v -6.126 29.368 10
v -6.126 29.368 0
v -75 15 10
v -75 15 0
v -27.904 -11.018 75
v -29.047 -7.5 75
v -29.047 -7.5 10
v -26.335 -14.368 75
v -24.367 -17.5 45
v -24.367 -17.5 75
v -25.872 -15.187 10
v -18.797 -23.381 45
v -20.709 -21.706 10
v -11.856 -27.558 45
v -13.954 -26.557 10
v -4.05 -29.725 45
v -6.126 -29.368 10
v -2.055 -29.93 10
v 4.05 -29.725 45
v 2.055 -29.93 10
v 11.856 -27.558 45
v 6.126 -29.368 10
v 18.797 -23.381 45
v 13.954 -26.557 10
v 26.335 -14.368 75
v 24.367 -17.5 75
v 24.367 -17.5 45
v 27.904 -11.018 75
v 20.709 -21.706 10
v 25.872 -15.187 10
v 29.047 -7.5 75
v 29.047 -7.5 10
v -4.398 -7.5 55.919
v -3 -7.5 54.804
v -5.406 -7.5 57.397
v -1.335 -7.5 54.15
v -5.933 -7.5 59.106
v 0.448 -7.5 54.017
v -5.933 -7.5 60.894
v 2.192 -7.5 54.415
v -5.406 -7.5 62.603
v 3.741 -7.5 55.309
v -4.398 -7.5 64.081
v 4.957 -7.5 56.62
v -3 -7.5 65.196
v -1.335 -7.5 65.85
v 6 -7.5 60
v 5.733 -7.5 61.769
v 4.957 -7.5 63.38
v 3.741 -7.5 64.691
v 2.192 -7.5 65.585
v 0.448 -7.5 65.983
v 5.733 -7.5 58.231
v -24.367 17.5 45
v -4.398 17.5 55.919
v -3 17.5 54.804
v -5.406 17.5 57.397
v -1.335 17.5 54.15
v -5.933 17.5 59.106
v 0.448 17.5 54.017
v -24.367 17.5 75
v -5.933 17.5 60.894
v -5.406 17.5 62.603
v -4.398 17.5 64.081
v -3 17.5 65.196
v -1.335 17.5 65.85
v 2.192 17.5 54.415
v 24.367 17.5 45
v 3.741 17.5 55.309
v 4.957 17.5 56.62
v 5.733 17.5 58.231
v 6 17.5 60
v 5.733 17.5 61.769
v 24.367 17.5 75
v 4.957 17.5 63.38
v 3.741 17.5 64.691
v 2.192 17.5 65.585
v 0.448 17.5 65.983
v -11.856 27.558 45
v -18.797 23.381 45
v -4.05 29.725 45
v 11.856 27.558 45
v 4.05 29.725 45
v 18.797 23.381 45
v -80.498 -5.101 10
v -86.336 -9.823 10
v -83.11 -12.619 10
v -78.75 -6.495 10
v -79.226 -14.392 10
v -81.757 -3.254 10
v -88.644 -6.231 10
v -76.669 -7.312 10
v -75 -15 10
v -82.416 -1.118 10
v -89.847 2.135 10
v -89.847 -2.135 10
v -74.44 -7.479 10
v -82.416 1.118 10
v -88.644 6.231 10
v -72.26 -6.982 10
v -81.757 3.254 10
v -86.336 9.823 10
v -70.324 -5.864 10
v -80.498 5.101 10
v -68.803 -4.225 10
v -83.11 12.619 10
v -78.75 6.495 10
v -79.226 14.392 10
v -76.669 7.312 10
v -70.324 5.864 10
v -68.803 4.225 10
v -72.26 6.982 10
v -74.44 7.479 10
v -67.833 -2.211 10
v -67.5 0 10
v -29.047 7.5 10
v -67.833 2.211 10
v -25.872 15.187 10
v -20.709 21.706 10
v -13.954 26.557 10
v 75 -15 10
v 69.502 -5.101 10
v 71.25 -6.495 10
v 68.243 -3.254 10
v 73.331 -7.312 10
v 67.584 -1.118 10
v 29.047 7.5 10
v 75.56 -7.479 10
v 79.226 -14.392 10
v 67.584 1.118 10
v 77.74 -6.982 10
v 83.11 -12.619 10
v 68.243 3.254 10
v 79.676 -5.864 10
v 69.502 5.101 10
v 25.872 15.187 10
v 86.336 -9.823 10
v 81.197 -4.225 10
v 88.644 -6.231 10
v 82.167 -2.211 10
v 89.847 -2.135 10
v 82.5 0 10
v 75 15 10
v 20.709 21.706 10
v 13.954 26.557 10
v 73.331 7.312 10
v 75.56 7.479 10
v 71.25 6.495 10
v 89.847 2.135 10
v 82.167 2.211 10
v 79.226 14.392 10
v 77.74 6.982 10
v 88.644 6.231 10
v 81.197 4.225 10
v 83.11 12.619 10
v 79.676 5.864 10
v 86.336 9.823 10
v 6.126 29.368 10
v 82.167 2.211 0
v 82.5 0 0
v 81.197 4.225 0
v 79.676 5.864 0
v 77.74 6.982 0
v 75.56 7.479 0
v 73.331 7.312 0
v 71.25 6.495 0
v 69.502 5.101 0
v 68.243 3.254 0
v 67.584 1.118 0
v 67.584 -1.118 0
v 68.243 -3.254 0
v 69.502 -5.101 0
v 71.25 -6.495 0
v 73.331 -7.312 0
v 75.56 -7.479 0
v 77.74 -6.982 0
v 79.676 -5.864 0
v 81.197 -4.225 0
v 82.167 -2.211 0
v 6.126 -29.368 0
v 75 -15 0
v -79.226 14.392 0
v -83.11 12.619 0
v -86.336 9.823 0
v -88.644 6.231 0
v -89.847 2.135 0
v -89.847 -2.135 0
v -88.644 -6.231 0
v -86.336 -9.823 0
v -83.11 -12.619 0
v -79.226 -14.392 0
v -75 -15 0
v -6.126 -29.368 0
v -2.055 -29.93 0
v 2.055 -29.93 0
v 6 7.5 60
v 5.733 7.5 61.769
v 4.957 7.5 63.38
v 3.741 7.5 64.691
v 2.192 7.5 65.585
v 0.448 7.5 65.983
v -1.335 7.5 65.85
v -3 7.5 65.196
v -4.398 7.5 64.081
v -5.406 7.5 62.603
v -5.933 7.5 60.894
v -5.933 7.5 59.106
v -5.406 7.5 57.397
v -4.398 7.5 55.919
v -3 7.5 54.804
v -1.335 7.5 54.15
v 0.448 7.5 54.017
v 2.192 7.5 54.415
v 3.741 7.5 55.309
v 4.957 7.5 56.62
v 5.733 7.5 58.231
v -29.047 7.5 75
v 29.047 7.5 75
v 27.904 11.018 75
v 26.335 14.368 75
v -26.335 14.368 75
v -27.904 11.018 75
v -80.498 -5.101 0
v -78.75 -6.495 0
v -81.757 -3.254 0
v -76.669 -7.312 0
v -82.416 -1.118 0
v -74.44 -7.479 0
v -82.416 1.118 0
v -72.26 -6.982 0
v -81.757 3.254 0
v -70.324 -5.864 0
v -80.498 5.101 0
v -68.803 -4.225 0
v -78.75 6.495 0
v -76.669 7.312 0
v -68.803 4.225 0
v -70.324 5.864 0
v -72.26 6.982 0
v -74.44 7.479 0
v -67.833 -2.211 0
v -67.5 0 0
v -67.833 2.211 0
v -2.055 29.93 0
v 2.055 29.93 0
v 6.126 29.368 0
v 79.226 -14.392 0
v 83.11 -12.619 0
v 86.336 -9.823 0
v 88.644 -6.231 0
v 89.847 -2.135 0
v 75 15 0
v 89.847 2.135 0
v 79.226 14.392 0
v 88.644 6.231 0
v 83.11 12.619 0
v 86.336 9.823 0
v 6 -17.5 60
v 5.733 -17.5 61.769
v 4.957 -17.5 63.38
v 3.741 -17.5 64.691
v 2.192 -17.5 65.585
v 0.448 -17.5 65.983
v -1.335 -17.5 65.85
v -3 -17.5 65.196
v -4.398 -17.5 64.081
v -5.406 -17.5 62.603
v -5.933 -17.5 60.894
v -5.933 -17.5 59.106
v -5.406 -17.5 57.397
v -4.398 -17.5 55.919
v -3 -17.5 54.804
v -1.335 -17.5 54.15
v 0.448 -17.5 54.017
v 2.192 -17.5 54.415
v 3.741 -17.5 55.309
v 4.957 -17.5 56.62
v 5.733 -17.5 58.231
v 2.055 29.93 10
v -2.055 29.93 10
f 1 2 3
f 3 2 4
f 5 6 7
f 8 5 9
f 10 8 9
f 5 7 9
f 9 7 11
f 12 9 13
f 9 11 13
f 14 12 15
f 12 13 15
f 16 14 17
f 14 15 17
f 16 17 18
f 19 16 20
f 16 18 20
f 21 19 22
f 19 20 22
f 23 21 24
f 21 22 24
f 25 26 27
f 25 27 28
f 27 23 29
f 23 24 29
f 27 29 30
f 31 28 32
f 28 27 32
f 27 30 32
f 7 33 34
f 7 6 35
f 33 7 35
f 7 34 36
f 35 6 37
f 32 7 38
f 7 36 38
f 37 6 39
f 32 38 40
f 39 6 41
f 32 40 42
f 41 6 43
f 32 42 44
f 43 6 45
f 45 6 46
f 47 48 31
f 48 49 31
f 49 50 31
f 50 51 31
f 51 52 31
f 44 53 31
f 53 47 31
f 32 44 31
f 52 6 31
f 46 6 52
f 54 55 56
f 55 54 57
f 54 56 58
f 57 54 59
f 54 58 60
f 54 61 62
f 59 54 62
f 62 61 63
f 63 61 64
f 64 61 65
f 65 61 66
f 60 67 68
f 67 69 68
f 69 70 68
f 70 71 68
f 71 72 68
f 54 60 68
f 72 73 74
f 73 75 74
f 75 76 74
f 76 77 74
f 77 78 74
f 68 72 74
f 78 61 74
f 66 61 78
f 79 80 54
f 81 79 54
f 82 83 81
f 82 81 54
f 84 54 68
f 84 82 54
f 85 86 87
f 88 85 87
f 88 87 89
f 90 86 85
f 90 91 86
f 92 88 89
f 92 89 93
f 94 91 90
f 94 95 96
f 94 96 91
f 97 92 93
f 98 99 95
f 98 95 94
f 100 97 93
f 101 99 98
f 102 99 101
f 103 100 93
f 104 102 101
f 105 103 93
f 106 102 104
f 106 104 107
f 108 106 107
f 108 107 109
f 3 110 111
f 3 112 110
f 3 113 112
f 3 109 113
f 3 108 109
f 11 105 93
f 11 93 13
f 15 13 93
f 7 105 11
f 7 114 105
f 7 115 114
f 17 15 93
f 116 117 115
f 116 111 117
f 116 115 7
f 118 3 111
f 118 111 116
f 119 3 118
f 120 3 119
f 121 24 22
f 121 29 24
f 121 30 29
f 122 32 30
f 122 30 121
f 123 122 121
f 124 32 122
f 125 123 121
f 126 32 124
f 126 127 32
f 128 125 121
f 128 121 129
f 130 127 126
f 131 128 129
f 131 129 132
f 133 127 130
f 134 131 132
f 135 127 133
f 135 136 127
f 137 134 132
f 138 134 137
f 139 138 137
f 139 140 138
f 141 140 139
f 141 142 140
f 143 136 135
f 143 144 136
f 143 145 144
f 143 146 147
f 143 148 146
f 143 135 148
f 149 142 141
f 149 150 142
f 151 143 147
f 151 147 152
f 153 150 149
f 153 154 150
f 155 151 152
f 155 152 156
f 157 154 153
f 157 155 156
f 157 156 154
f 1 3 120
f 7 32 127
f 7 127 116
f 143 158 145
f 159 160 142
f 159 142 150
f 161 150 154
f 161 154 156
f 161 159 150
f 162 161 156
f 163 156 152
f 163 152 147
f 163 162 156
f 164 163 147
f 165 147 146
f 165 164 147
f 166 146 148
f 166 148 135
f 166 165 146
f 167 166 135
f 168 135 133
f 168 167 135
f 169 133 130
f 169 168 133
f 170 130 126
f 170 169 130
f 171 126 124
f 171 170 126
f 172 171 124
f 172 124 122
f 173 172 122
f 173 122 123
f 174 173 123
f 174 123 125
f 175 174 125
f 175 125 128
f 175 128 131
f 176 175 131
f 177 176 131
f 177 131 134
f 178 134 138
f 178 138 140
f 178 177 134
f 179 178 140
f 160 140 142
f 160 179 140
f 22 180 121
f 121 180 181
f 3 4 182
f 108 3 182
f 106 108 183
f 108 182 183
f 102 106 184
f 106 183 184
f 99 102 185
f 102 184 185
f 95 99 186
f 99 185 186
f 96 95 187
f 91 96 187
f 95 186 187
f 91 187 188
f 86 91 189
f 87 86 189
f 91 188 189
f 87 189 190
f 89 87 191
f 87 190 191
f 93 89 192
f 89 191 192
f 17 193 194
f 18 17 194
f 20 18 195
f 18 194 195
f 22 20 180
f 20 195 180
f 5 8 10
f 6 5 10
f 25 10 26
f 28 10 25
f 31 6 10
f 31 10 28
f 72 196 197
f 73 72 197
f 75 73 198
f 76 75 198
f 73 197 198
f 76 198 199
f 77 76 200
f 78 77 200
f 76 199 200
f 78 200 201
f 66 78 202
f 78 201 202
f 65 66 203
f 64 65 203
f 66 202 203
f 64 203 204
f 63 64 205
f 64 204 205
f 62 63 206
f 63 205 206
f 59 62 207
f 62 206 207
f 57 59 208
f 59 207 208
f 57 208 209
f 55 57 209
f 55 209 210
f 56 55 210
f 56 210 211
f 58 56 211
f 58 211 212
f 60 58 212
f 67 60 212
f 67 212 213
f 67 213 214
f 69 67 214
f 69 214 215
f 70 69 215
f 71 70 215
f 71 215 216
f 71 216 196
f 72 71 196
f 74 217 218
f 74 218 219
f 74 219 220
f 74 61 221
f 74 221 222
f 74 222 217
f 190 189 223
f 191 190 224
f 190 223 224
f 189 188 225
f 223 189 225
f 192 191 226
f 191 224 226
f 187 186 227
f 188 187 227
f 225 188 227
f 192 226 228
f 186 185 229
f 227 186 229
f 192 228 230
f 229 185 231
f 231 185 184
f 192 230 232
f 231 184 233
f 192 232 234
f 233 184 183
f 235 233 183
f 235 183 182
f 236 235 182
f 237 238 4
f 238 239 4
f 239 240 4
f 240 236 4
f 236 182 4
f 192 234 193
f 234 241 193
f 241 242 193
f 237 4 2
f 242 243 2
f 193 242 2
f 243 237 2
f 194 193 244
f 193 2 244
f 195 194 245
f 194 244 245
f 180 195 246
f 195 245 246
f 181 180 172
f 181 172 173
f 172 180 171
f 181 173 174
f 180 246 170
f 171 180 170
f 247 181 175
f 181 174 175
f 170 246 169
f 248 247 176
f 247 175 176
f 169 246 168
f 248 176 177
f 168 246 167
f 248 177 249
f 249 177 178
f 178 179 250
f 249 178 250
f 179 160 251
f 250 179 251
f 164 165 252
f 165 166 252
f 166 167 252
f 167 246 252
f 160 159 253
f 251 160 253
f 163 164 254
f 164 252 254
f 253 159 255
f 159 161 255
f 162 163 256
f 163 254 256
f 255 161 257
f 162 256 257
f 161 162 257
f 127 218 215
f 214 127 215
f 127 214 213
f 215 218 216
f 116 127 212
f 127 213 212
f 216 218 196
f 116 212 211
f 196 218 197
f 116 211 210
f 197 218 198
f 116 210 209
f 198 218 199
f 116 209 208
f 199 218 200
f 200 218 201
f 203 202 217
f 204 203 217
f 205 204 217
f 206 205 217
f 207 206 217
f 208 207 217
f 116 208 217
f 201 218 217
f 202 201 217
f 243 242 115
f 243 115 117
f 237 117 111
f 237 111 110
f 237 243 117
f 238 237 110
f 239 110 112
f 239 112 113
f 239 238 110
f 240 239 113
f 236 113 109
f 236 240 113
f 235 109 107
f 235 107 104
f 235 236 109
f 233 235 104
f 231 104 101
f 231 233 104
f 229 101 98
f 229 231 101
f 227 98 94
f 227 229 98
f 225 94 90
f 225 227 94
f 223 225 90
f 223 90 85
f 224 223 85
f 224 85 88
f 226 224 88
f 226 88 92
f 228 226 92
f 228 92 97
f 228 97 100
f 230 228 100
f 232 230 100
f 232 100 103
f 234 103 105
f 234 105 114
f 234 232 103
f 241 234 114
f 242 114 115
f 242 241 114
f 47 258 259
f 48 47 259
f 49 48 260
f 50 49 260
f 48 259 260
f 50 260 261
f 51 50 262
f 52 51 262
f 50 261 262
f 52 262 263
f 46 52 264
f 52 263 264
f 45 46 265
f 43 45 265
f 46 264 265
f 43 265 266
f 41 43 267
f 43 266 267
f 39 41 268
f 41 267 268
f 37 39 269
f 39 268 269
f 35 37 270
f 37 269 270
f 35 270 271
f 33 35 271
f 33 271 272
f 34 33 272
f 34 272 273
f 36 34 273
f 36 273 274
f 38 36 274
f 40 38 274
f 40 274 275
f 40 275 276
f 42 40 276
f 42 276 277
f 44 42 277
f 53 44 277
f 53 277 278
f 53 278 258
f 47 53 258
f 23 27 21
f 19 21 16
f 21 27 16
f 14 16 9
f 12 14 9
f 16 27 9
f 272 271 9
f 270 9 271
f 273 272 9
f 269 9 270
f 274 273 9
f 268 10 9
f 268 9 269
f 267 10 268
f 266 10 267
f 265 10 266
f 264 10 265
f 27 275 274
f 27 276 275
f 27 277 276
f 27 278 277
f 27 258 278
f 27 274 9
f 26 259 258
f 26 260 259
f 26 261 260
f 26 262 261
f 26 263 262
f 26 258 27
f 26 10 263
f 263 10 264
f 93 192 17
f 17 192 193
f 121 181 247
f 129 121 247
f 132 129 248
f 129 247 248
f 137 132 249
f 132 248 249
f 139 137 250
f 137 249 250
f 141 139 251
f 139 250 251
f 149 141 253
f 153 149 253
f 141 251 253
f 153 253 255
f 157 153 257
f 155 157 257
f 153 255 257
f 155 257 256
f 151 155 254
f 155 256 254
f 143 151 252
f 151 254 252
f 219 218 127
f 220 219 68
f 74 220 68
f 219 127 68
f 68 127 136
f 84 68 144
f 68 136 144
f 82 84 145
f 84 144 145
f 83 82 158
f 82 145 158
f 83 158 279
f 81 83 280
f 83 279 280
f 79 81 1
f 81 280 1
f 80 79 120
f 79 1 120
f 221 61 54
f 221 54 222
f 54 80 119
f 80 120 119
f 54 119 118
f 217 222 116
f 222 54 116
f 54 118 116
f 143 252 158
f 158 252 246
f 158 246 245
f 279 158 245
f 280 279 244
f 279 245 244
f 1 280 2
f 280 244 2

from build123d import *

# Parameters (mm, degrees)
SKETCH1_R               = 7.5
BOSS_EXTRUDE1_DEPTH     = 10
SKETCH2_R               = 30
BOSS_EXTRUDE2_DEPTH     = 65
CUT_EXTRUDE1_DEPTH      = 65
CUT_EXTRUDE2_DEPTH      = 30
SKETCH7_R               = 6
CUT_EXTRUDE3_DEPTH      = 13.5
CUT_EXTRUDE3_DEPTH_BACK = 48.5


with BuildPart() as part:
    # Sketch1 → Boss-Extrude1 (new body)
    with BuildSketch(Plane.XY):
        with BuildLine():
            Line((75, 15), (6.126443354, 29.36778323))
            ThreePointArc((6.126443354, 29.36778323), (0, 30), (-6.126443354, 29.36778323))
            Line((-6.126443354, 29.36778323), (-75, 15))
            ThreePointArc((-75, 15), (-90, 0), (-75, -15))
            Line((-75, -15), (-6.126443354, -29.36778323))
            ThreePointArc((-6.126443354, -29.36778323), (0, -30), (6.126443354, -29.36778323))
            Line((6.126443354, -29.36778323), (75, -15))
            ThreePointArc((75, -15), (90, 0), (75, 15))
        make_face()
        with Locations((75, 0)):
            Circle(SKETCH1_R, mode=Mode.SUBTRACT)
        with Locations((-75, 0)):
            Circle(SKETCH1_R, mode=Mode.SUBTRACT)
    extrude(amount=BOSS_EXTRUDE1_DEPTH)

    # Sketch2 → Boss-Extrude2 (add)
    with BuildSketch(Plane.XY.offset(10)):
        Circle(SKETCH2_R)
    extrude(amount=BOSS_EXTRUDE2_DEPTH)

    # Sketch3 → Cut-Extrude1 (cut)
    with BuildSketch(Plane.XY.offset(75)):
        with BuildLine():
            Line((-29.047375097, -7.5), (29.047375097, -7.5))
            ThreePointArc((29.047375097, -7.5), (30, 0), (29.047375097, 7.5))
            Line((29.047375097, 7.5), (-29.047375097, 7.5))
            ThreePointArc((-29.047375097, 7.5), (-30, 0), (-29.047375097, -7.5))
        make_face()
    extrude(amount=-CUT_EXTRUDE1_DEPTH, mode=Mode.SUBTRACT)

    # Sketch4 → Cut-Extrude2 (cut)
    with BuildSketch(Plane.XY.offset(75)):
        with BuildLine():
            Line((-24.366985862, -17.5), (24.366985862, -17.5))
            ThreePointArc((24.366985862, -17.5), (0, -30), (-24.366985862, -17.5))
        make_face()
        with BuildLine():
            Line((-24.366985862, 17.5), (24.366985862, 17.5))
            ThreePointArc((24.366985862, 17.5), (0, 30), (-24.366985862, 17.5))
        make_face()
    extrude(amount=-CUT_EXTRUDE2_DEPTH, mode=Mode.SUBTRACT)

    # Sketch7 → Cut-Extrude3 (cut, two sides)
    with BuildSketch(Plane.XZ.offset(17.5)) as cut_extrude3_sk:
        with Locations((0, 60)):
            Circle(SKETCH7_R)
    extrude(amount=CUT_EXTRUDE3_DEPTH, mode=Mode.SUBTRACT)
    extrude(cut_extrude3_sk.sketch, amount=-CUT_EXTRUDE3_DEPTH_BACK, mode=Mode.SUBTRACT)


solid = part.part
